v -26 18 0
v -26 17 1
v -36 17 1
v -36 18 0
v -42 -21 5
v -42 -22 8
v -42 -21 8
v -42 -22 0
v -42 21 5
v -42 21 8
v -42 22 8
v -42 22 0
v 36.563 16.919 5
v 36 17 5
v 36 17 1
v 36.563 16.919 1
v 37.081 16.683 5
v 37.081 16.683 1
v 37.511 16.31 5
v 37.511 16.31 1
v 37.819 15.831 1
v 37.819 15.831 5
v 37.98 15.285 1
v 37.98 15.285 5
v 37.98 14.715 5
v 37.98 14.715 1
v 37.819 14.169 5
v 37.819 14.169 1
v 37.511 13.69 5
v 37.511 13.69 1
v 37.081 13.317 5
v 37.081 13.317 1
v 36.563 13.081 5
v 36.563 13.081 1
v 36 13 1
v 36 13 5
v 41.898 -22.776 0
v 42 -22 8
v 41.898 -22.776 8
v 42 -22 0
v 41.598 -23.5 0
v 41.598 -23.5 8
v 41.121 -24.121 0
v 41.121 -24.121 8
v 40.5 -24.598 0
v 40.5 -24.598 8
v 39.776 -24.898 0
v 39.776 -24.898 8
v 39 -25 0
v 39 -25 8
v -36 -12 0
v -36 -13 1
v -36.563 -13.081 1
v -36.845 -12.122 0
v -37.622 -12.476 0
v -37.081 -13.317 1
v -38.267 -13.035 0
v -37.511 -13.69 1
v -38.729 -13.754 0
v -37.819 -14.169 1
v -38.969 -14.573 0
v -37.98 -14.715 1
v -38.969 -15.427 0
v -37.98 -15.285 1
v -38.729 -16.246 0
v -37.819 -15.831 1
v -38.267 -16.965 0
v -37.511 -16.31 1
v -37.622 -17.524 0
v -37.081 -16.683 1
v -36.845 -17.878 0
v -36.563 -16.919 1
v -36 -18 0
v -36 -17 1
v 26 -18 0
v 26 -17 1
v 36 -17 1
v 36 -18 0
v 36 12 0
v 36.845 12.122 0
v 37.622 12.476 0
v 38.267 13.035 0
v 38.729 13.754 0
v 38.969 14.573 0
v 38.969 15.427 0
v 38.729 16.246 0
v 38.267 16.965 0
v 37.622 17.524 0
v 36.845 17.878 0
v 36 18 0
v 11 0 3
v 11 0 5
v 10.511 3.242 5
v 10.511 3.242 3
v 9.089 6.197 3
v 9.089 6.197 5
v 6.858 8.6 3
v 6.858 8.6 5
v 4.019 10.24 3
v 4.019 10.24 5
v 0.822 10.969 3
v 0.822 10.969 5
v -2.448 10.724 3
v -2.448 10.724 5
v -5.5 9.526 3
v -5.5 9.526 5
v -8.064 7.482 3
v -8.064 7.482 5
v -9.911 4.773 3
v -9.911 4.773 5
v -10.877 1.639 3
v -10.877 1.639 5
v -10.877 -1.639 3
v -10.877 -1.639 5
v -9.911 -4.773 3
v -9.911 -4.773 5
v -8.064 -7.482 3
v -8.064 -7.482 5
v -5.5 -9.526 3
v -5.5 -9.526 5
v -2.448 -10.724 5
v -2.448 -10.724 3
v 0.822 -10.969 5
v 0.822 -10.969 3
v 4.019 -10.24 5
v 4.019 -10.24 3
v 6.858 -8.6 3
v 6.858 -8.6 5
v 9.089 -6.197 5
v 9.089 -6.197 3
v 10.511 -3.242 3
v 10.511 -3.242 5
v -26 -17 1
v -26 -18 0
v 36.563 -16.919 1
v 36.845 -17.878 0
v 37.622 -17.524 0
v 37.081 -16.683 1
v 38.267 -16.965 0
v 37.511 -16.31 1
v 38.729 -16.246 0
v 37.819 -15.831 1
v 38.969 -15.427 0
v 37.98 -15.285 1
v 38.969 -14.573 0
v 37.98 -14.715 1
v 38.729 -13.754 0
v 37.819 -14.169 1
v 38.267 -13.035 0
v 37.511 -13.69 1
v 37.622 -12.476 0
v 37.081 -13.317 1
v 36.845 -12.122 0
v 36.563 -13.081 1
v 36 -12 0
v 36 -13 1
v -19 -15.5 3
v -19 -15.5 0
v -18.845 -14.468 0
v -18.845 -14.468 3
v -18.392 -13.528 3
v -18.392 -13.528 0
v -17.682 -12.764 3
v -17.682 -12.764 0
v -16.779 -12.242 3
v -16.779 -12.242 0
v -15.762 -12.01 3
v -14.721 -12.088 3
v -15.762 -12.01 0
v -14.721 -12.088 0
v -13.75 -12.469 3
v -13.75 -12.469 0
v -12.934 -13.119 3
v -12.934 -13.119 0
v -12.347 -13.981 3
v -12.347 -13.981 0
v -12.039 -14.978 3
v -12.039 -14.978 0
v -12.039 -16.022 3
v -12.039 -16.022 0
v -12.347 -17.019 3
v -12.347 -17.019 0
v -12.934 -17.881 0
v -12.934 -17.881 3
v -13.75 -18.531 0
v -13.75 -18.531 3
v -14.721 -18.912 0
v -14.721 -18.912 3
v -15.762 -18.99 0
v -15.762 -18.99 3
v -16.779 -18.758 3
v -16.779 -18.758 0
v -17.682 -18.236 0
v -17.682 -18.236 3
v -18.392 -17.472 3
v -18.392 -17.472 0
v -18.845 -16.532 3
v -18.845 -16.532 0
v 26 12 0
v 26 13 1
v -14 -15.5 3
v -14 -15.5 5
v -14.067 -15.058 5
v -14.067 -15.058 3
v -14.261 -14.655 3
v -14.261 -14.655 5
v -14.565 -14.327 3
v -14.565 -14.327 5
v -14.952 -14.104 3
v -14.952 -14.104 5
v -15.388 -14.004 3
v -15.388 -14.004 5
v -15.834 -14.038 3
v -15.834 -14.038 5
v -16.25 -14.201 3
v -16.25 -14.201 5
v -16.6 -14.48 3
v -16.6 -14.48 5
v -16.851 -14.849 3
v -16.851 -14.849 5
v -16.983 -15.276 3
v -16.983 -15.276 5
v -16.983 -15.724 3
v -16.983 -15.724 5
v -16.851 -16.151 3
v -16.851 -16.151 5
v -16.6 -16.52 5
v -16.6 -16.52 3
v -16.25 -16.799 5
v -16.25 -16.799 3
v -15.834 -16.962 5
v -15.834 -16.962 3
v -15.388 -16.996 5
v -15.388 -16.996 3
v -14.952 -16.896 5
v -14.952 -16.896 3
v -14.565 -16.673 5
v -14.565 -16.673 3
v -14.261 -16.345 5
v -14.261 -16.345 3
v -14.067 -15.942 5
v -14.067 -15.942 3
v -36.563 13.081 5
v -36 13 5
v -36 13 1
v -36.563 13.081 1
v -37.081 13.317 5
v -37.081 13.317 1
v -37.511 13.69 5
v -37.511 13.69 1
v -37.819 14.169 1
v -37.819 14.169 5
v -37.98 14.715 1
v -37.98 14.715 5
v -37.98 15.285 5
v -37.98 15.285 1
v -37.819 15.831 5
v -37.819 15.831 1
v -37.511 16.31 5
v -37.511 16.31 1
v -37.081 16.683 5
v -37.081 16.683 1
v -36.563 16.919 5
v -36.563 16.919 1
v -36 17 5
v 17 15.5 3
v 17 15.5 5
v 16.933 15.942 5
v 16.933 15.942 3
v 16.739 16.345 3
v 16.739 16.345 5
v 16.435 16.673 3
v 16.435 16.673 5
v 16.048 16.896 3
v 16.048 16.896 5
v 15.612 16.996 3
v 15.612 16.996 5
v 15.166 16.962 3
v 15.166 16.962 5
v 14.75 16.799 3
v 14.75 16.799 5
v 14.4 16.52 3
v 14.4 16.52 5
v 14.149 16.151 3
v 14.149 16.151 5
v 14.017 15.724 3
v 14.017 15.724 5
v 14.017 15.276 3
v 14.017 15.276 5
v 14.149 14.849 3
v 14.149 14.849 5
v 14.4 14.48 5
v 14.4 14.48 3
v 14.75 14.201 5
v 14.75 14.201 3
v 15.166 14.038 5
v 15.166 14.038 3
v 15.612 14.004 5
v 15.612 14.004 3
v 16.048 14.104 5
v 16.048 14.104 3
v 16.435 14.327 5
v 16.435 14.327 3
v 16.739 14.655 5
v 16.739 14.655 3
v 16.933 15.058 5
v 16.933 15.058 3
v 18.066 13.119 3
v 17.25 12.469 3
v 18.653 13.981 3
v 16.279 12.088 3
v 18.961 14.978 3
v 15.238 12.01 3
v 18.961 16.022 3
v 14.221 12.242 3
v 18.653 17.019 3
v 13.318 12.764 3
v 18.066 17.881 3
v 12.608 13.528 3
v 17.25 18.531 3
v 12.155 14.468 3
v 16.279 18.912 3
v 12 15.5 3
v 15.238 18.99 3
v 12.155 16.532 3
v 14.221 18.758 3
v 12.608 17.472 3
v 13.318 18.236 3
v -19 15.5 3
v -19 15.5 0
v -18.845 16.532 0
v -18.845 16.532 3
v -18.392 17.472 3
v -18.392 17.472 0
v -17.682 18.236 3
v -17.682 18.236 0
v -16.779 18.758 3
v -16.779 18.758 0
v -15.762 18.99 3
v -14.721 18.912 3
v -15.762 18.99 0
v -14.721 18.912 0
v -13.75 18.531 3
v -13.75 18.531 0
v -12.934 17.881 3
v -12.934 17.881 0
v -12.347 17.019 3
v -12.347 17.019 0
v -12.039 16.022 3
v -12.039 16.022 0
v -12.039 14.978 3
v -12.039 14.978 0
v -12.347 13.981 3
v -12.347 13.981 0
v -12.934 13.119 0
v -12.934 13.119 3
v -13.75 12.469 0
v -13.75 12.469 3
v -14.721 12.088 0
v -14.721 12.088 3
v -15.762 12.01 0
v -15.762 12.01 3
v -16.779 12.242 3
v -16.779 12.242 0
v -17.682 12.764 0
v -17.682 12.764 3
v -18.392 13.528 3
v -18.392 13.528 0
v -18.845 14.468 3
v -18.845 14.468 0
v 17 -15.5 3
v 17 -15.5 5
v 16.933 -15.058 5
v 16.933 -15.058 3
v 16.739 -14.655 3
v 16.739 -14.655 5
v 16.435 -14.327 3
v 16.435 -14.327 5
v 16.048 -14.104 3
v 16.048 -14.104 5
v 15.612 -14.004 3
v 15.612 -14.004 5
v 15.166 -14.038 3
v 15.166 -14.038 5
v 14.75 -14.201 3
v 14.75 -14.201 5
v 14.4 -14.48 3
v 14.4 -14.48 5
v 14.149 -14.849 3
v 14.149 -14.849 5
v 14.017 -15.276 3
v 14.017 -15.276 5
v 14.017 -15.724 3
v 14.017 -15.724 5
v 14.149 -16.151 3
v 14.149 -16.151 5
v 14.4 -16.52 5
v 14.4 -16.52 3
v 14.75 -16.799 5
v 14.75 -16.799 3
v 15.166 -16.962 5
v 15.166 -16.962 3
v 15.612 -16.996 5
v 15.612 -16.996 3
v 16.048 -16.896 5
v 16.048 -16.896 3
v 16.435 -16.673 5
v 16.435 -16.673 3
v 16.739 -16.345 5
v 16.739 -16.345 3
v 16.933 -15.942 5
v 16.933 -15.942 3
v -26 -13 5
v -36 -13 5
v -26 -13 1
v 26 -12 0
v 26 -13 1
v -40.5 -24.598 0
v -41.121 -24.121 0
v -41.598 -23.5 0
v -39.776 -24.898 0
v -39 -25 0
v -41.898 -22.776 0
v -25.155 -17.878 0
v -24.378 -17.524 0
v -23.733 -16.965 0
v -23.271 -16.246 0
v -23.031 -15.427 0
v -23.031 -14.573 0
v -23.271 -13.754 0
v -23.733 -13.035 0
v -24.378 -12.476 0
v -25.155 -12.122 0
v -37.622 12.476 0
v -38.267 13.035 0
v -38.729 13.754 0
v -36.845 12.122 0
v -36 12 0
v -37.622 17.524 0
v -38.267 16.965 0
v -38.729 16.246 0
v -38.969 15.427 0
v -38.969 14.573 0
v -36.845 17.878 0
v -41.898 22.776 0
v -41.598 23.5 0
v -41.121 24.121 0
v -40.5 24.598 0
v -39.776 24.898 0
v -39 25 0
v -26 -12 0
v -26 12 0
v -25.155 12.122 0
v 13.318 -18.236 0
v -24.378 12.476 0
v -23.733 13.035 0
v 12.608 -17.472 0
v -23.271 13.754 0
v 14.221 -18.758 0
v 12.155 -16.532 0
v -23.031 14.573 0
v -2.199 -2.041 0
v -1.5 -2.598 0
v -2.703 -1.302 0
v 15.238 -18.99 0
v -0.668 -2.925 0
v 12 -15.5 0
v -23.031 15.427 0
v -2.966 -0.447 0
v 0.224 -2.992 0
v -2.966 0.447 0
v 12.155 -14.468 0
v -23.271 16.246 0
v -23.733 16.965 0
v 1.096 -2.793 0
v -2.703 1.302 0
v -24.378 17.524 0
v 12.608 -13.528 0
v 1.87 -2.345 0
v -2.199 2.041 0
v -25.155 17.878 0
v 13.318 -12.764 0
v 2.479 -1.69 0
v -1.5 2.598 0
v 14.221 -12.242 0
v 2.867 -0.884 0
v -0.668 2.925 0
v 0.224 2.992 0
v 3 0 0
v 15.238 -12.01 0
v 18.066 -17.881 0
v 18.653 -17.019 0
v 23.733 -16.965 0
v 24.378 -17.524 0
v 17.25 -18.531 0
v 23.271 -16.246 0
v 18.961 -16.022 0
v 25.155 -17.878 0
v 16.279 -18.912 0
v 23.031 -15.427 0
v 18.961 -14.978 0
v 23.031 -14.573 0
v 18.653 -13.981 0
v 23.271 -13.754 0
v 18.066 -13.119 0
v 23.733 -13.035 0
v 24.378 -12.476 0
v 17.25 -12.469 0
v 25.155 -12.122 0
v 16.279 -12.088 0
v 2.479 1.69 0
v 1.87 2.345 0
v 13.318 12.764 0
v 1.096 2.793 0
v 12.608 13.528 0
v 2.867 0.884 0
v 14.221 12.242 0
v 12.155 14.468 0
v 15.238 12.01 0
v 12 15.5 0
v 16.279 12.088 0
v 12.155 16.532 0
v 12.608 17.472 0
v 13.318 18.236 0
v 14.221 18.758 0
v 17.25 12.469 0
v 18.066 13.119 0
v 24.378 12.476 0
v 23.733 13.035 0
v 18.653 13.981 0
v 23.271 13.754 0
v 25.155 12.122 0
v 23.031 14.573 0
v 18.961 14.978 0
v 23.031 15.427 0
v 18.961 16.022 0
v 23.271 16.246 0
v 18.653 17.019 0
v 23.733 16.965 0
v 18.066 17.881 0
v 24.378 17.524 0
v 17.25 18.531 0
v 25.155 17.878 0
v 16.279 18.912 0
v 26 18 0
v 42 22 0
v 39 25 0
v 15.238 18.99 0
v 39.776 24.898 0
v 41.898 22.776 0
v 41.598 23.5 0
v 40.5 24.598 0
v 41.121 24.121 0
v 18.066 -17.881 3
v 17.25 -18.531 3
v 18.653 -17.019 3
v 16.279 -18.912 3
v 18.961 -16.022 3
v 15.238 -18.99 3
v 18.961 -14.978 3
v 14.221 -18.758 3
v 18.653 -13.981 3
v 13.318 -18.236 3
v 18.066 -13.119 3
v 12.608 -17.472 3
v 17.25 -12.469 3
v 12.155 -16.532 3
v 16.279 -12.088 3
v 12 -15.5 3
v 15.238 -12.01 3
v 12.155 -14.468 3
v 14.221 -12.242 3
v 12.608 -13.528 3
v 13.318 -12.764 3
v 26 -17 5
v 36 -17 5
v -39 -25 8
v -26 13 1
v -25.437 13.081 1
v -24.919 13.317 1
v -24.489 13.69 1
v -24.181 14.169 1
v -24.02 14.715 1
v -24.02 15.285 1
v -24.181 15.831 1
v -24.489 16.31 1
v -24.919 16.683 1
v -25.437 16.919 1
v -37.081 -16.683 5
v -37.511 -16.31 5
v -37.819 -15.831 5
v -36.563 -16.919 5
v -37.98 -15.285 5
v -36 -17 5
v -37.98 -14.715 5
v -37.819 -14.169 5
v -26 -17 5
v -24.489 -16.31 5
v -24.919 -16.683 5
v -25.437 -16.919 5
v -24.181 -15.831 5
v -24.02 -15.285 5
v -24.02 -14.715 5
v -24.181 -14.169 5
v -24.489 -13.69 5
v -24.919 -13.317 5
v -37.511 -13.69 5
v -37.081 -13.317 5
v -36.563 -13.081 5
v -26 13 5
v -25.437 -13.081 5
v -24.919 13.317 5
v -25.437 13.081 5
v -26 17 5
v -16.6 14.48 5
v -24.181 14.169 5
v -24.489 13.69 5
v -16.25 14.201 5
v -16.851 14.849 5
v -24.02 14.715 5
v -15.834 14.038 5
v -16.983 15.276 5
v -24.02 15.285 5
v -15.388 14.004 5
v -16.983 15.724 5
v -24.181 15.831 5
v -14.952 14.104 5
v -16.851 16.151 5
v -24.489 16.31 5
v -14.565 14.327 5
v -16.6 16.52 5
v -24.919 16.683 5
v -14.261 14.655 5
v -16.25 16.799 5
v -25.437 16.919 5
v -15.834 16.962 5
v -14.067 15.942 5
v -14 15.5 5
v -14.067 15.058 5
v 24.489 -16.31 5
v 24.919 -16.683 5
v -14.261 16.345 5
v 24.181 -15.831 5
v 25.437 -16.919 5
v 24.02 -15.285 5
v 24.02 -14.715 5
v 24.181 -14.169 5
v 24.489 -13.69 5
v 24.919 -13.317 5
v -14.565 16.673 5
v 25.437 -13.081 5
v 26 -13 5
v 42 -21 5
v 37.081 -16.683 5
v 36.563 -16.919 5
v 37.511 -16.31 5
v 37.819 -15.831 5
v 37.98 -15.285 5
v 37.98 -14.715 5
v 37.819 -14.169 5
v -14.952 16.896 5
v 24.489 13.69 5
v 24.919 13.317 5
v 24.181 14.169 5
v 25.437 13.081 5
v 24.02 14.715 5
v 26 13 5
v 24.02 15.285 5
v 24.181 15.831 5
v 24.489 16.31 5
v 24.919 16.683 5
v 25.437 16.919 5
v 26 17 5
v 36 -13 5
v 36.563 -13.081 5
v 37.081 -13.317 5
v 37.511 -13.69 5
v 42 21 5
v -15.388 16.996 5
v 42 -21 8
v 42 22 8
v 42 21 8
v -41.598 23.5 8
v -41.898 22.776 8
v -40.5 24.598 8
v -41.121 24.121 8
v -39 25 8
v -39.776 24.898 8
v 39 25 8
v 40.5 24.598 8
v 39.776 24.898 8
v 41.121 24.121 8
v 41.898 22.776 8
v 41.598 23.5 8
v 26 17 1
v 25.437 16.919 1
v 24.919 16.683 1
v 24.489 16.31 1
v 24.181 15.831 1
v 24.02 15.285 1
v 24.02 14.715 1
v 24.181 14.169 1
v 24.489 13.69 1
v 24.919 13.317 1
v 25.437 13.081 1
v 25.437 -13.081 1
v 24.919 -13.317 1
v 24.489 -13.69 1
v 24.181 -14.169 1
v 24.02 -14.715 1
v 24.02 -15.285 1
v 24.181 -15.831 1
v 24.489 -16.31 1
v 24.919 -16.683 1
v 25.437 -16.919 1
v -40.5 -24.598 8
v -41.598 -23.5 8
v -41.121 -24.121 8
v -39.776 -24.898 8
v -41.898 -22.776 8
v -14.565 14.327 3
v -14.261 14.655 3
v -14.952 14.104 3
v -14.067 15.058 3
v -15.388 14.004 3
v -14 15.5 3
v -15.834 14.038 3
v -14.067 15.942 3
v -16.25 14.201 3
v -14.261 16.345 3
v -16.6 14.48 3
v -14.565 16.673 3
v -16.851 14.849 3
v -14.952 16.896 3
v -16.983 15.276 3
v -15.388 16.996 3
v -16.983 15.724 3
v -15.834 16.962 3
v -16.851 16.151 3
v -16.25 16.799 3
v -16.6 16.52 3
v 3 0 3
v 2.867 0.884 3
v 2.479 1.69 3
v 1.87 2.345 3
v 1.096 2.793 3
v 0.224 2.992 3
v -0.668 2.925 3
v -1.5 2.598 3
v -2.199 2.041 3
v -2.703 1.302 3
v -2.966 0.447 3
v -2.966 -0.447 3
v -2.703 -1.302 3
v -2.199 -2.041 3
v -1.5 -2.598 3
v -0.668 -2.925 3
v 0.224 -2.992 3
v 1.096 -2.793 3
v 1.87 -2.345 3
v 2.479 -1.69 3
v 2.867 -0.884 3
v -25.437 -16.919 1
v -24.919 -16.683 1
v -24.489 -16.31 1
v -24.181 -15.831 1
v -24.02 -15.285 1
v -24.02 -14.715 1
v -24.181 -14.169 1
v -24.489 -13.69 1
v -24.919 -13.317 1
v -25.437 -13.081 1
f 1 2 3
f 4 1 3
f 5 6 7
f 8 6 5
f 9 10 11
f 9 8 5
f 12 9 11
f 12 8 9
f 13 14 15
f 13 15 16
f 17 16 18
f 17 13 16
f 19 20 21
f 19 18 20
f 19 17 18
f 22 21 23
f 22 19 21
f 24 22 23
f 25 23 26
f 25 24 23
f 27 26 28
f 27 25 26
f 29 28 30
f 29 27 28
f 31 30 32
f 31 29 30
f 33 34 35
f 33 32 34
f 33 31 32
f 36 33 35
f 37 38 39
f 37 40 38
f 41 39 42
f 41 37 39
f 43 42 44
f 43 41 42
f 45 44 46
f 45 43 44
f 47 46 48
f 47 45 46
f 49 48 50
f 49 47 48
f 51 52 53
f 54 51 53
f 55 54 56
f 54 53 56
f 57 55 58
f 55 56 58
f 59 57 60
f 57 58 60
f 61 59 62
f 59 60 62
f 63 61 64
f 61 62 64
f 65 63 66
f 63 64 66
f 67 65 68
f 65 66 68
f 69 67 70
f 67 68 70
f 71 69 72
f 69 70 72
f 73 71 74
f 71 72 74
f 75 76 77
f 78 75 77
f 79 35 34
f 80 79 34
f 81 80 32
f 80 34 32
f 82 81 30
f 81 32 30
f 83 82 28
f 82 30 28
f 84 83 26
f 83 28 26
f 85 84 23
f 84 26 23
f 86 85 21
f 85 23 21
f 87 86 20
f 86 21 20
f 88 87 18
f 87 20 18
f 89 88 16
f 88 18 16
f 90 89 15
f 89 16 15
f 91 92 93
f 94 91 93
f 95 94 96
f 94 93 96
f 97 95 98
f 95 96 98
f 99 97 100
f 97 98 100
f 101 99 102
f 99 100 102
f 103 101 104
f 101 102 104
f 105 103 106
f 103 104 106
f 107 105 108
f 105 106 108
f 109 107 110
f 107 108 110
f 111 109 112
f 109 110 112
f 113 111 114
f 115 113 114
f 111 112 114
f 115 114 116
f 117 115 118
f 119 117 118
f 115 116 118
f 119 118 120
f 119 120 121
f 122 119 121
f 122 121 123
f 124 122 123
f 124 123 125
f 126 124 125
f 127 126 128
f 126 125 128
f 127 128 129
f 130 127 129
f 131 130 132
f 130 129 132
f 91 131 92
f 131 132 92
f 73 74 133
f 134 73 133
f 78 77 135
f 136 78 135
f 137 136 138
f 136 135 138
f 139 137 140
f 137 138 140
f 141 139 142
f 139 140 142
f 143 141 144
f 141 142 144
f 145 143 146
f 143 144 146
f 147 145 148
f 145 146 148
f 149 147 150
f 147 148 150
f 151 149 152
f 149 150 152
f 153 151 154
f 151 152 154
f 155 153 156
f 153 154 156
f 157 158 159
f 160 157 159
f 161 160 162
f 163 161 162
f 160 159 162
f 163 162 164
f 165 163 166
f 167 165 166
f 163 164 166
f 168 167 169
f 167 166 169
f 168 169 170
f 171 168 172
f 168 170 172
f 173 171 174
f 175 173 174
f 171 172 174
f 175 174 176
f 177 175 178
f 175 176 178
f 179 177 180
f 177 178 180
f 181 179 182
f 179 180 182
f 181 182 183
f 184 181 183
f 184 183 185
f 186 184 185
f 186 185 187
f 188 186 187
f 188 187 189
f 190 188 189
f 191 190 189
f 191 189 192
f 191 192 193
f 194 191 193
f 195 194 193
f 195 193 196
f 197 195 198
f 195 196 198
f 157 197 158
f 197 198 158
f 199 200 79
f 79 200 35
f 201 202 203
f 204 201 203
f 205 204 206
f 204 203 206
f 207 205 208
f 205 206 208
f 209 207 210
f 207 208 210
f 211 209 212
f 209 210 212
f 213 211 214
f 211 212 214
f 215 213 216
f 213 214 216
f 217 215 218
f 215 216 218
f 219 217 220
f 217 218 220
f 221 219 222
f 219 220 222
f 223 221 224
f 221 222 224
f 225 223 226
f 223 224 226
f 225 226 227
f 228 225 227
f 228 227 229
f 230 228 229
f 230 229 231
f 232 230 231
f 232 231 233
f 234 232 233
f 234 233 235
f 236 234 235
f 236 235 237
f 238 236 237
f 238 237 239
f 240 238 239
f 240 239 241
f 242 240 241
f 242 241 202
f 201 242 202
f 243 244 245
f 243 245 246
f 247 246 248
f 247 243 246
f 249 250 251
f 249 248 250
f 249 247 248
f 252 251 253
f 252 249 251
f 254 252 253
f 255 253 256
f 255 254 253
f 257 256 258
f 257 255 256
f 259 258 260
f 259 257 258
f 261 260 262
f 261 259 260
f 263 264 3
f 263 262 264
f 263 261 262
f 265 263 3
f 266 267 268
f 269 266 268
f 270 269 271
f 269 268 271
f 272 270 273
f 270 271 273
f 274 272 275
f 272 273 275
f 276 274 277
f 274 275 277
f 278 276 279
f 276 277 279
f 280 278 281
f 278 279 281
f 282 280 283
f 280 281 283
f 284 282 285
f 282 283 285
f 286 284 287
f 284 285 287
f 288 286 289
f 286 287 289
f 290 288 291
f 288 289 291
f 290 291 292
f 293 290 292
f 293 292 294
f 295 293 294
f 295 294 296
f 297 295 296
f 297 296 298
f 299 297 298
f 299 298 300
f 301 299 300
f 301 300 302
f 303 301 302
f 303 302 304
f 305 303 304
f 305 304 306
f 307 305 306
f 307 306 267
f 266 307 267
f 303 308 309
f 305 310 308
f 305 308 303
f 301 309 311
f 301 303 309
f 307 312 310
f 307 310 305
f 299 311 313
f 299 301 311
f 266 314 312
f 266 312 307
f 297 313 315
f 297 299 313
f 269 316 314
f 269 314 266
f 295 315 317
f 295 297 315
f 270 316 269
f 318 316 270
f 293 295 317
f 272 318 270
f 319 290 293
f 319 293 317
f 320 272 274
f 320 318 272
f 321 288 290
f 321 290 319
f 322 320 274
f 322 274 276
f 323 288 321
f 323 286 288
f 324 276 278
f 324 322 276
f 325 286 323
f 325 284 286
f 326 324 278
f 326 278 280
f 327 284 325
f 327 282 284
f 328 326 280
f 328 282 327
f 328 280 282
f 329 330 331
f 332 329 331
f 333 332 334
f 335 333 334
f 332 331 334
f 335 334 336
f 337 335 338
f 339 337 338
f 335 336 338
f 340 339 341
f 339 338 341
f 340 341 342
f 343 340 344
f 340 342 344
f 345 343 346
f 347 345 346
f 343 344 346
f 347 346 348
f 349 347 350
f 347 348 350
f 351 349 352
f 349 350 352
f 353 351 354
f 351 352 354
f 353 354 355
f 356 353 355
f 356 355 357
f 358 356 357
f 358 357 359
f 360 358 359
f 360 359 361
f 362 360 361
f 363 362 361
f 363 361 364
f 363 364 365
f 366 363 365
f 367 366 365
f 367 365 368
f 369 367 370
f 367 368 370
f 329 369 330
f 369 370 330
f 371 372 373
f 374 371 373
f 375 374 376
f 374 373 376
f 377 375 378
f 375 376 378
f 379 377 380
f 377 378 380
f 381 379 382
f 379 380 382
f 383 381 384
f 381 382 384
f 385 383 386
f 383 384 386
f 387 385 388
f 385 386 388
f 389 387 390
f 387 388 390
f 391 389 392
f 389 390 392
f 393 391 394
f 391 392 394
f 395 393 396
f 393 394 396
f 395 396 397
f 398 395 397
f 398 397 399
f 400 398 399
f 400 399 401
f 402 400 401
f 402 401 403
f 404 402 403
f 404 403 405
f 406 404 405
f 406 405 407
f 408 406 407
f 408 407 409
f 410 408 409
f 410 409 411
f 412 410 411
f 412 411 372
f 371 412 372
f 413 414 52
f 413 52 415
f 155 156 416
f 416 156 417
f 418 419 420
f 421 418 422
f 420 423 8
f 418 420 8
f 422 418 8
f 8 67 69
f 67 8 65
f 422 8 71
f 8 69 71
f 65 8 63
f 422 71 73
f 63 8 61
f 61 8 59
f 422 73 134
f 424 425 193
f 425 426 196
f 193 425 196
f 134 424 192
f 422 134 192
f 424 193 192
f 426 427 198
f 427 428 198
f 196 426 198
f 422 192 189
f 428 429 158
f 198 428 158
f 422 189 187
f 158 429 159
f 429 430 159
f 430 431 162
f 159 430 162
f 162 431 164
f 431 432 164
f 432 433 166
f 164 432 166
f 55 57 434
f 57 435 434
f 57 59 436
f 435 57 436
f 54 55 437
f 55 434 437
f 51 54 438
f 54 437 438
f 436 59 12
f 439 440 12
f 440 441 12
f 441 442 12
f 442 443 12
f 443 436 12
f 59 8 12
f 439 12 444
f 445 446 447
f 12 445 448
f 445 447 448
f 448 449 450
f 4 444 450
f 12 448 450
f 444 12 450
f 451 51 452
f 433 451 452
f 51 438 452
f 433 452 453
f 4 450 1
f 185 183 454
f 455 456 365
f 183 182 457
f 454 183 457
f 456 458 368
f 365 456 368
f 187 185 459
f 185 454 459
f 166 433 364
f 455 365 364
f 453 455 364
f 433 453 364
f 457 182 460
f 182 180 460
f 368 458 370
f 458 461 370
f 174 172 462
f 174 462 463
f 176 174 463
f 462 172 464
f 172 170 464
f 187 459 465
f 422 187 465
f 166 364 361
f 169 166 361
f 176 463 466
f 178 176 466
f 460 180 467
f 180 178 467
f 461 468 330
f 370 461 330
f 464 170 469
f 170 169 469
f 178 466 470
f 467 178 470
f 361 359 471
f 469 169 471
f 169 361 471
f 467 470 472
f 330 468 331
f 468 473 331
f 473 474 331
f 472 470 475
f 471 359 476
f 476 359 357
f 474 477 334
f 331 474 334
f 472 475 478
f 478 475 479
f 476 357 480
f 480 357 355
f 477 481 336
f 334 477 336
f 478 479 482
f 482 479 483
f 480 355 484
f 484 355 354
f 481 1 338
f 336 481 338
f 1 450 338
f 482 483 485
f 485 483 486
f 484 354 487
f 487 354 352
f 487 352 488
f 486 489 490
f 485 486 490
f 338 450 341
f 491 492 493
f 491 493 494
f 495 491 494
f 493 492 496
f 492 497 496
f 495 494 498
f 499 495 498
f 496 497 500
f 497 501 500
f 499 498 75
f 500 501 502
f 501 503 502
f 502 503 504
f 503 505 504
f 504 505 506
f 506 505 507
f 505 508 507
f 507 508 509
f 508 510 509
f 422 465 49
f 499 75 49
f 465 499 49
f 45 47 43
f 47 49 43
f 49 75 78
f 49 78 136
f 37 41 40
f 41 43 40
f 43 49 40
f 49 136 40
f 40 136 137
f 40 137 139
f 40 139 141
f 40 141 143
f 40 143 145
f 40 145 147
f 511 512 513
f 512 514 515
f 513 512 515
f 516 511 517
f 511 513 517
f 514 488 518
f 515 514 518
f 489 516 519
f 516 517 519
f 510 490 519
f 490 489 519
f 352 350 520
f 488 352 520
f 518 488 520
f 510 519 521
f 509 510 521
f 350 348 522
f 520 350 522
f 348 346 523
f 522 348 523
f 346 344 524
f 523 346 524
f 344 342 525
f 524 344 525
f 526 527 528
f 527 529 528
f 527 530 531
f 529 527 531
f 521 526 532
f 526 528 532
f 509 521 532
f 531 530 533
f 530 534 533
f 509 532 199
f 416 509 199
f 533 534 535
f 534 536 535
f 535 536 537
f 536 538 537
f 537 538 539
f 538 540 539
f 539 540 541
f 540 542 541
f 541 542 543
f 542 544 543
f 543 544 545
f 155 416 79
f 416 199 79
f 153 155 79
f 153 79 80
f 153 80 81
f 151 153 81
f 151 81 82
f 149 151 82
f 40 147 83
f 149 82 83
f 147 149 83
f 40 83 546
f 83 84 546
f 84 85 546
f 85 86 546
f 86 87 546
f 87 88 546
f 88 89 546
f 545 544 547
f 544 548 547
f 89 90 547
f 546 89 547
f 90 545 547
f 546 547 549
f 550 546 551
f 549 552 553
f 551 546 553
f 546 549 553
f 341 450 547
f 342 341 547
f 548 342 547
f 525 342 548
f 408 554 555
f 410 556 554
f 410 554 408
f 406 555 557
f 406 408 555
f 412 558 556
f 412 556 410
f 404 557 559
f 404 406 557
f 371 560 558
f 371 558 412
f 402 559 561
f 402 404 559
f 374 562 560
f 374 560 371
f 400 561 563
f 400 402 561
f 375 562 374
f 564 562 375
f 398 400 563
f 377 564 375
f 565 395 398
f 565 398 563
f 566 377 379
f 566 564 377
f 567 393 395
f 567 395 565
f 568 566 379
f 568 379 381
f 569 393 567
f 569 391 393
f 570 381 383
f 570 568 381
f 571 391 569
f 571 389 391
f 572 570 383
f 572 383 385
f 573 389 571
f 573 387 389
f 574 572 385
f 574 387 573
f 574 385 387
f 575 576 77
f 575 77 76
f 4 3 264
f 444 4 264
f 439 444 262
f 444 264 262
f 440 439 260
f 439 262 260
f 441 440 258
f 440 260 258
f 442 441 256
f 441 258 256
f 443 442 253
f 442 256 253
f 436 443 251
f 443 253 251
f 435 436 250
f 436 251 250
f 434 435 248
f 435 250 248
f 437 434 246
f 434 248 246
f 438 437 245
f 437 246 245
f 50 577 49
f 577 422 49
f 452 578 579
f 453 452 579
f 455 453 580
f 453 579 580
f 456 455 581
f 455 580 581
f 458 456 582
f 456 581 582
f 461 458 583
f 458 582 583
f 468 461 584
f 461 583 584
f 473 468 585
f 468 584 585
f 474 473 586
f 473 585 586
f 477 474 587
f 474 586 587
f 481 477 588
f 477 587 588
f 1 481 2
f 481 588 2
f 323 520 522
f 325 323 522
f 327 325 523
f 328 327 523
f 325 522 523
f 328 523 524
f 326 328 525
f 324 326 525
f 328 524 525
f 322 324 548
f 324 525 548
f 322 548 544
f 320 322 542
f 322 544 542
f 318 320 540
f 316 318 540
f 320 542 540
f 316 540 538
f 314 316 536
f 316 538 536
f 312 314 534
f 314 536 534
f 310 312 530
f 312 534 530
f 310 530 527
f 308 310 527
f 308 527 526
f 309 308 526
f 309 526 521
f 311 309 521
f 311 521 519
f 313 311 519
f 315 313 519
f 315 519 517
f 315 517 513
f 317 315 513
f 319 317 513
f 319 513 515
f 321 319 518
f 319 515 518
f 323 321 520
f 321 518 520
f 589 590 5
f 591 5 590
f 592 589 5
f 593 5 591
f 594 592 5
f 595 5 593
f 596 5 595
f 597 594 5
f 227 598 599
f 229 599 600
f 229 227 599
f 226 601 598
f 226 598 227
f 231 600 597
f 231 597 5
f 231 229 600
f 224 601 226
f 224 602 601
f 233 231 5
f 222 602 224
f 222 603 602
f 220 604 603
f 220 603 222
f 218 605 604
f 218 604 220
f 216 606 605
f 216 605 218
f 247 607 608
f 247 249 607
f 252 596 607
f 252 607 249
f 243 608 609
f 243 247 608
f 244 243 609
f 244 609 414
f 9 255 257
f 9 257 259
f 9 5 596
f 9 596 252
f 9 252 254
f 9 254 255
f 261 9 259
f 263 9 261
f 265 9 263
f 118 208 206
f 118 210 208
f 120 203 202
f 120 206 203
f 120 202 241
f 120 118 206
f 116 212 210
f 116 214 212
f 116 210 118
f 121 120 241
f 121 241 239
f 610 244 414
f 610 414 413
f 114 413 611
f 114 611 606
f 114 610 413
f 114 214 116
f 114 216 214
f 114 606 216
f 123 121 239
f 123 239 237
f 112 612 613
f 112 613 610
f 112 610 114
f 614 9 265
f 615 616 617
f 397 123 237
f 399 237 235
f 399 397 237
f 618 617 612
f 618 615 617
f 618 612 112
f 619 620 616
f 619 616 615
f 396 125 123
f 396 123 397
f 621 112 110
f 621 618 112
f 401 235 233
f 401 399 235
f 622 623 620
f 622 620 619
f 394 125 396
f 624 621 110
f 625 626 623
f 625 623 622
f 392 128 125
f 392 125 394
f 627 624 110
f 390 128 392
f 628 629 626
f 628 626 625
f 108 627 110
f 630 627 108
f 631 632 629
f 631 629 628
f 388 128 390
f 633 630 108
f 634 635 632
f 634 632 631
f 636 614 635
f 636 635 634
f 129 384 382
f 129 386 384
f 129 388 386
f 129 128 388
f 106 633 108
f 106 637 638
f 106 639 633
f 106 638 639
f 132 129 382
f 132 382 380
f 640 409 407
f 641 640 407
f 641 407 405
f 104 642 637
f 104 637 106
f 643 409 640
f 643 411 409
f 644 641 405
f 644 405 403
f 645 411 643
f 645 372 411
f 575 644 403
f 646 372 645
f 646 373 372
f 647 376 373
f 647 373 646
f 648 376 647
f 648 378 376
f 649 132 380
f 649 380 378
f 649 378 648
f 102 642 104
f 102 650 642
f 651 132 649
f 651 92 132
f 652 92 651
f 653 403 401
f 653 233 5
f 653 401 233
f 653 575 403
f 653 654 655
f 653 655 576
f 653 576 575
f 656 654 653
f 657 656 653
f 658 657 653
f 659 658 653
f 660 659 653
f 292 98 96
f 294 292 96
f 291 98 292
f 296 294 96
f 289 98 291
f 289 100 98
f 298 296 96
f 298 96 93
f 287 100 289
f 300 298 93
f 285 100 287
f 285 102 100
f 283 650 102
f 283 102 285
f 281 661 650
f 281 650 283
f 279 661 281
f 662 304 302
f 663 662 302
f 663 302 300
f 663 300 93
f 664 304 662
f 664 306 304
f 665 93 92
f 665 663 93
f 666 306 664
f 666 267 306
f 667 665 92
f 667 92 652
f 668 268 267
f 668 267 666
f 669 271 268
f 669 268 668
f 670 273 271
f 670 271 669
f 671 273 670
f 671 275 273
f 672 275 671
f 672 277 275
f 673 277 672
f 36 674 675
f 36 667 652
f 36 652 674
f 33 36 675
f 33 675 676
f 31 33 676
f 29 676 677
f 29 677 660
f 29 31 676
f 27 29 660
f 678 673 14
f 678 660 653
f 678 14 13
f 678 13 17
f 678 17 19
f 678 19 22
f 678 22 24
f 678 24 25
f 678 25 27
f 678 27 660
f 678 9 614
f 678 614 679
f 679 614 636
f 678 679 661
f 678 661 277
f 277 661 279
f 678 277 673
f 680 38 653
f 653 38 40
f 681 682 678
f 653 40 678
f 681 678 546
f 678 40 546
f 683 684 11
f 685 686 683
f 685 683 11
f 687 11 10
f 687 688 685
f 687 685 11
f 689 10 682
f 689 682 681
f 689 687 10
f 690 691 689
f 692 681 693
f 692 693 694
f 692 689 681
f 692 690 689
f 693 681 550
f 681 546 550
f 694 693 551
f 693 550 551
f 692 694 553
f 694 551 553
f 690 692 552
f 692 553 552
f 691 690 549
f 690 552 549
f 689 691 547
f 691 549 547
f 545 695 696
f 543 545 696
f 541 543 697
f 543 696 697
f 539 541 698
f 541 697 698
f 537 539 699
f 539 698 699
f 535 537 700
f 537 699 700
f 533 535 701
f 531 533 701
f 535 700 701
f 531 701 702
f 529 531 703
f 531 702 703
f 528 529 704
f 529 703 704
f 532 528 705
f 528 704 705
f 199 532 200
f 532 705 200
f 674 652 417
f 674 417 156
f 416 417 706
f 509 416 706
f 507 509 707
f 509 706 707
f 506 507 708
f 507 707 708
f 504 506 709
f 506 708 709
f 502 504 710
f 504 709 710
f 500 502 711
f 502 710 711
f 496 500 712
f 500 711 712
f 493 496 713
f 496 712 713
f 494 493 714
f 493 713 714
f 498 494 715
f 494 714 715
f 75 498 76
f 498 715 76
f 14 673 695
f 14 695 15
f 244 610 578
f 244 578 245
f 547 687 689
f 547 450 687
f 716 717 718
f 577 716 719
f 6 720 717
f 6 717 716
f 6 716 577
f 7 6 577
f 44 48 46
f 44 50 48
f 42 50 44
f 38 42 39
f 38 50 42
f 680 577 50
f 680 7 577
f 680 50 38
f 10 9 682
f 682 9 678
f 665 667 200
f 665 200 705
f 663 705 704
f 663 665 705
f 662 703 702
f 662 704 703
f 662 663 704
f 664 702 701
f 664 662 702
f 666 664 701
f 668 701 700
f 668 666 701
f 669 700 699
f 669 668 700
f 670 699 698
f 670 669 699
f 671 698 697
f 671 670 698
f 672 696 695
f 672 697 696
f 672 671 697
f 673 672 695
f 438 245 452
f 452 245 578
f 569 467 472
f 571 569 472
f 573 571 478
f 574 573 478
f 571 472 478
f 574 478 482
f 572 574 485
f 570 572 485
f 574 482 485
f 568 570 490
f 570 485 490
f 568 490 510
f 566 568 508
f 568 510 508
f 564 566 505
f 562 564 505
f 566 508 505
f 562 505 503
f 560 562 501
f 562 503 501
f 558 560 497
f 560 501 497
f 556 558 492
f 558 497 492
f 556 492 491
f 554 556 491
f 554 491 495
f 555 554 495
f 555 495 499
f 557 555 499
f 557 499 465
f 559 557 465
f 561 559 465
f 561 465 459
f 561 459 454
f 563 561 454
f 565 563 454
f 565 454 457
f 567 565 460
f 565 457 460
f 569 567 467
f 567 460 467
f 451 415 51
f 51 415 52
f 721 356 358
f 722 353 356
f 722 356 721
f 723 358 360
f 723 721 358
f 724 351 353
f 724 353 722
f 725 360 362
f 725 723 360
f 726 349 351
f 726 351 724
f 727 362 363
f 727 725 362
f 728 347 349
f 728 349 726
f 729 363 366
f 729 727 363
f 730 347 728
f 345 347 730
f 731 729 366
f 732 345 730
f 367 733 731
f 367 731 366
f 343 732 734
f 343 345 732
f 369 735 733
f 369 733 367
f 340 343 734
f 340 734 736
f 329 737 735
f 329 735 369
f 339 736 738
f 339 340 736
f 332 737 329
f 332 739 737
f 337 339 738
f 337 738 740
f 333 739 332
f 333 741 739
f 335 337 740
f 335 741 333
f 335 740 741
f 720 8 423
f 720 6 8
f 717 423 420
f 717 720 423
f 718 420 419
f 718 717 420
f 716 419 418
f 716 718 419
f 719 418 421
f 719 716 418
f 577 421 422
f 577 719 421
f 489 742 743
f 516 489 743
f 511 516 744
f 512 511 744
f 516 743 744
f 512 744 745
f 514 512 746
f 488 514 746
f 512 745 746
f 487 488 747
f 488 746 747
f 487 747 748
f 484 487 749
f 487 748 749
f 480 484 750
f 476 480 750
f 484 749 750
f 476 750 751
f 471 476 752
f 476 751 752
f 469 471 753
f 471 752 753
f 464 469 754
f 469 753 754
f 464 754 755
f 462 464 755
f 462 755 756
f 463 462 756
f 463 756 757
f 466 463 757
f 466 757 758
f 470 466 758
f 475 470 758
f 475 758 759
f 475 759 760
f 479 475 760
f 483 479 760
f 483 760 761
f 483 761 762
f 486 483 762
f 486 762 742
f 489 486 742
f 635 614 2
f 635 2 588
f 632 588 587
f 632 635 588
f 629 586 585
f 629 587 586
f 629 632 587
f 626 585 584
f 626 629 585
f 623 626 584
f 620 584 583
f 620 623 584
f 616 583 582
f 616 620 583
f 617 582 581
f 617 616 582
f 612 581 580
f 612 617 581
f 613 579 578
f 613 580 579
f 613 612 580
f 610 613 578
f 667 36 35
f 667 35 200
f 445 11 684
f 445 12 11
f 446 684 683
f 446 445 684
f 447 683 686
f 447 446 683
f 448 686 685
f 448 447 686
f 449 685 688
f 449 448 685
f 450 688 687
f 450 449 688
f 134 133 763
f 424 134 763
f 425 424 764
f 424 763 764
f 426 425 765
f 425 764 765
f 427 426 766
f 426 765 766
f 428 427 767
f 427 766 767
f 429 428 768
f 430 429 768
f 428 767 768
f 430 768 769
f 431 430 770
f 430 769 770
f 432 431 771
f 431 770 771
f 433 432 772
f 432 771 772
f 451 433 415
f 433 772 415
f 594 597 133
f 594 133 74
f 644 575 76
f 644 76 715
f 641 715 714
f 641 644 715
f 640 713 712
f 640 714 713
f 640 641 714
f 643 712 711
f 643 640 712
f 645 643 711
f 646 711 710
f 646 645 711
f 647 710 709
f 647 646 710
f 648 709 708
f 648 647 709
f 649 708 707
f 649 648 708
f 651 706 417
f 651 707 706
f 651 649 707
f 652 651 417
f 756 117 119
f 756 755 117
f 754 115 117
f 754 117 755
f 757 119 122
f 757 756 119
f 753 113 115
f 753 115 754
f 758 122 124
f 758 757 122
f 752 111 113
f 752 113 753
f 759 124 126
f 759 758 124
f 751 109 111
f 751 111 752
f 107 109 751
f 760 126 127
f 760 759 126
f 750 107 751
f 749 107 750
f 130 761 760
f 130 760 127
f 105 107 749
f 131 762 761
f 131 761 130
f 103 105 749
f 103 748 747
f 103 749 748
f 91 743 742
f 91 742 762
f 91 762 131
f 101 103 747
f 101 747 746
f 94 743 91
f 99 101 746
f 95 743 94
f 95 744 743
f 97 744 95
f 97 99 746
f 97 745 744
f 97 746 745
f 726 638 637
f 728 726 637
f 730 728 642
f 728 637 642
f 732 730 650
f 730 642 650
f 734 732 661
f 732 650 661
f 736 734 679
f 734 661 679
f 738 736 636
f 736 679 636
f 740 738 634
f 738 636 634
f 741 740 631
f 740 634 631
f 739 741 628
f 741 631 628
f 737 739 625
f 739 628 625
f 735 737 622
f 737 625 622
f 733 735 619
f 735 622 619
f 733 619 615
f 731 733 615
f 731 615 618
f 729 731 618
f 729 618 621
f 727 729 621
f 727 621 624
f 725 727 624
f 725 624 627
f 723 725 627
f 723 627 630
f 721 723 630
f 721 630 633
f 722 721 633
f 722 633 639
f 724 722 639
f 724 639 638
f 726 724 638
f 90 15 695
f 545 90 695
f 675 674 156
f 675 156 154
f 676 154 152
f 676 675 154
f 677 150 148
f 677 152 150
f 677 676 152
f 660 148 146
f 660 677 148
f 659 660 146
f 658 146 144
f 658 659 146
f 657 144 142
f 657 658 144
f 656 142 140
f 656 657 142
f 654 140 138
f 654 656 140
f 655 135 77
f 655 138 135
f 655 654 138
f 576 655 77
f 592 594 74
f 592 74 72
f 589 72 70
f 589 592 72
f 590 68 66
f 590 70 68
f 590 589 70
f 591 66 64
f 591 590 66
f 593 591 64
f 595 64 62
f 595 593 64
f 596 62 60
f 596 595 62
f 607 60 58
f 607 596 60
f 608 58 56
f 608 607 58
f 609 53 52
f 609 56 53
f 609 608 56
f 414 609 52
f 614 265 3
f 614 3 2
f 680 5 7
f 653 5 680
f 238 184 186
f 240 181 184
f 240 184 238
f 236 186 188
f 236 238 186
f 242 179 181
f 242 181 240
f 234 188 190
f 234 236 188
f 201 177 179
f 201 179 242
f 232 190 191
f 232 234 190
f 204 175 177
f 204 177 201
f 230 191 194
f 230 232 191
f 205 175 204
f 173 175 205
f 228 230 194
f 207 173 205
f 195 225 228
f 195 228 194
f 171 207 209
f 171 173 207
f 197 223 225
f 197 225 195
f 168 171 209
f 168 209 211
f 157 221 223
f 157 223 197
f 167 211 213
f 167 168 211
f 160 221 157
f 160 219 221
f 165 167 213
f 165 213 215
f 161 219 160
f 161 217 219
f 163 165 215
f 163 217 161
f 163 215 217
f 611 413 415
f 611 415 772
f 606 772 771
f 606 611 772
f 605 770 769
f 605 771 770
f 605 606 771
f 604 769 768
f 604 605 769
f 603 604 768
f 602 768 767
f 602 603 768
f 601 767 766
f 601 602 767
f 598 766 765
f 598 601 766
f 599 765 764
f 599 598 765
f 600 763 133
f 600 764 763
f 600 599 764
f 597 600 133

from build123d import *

# Parameters (mm, degrees)
CROQUIS1_W              = 84
CROQUIS1_H              = 50
SALIENTE_EXTRUIR1_DEPTH = 5
CORTAR_EXTRUIR5_DEPTH   = 50.132473986
CROQUIS2_R              = 3
CORTAR_EXTRUIR1_DEPTH   = 50.132473986
CROQUIS3_R              = 11
CORTAR_EXTRUIR2_DEPTH   = 2
CROQUIS4_R              = 1.5
CORTAR_EXTRUIR3_DEPTH   = 50.132473986
CROQUIS5_R              = 3.5
CORTAR_EXTRUIR4_DEPTH   = 3
CROQUIS7_W              = 84
CROQUIS7_H              = 4
SALIENTE_EXTRUIR2_DEPTH = 3
REDONDEO1_R             = 3
CHAFL_N1_SIZE           = 1


with BuildPart() as part:
    # Croquis1 → Saliente-Extruir1 (new body)
    with BuildSketch(Plane.XY):
        Rectangle(CROQUIS1_W, CROQUIS1_H)
    extrude(amount=SALIENTE_EXTRUIR1_DEPTH)

    # Croquis6 → Cortar-Extruir5 (cut, through all)
    with BuildSketch(Plane.XY.offset(5)):
        with BuildLine():
            Line((-36, 17), (-26, 17))
            ThreePointArc((-26, 17), (-24, 15), (-26, 13))
            Line((-26, 13), (-36, 13))
            ThreePointArc((-36, 13), (-38, 15), (-36, 17))
        make_face()
        with BuildLine():
            Line((36, 13), (26, 13))
            ThreePointArc((26, 13), (24, 15), (26, 17))
            Line((26, 17), (36, 17))
            ThreePointArc((36, 17), (38, 15), (36, 13))
        make_face()
        with BuildLine():
            Line((36, -17), (26, -17))
            ThreePointArc((26, -17), (24, -15), (26, -13))
            Line((26, -13), (36, -13))
            ThreePointArc((36, -13), (38, -15), (36, -17))
        make_face()
        with BuildLine():
            Line((-36, -13), (-26, -13))
            ThreePointArc((-26, -13), (-24, -15), (-26, -17))
            Line((-26, -17), (-36, -17))
            ThreePointArc((-36, -17), (-38, -15), (-36, -13))
        make_face()
    extrude(amount=-CORTAR_EXTRUIR5_DEPTH, mode=Mode.SUBTRACT)

    # Croquis2 → Cortar-Extruir1 (cut, through all)
    with BuildSketch(Plane.XY.offset(5)):
        Circle(CROQUIS2_R)
    extrude(amount=-CORTAR_EXTRUIR1_DEPTH, mode=Mode.SUBTRACT)

    # Croquis3 → Cortar-Extruir2 (cut)
    with BuildSketch(Plane.XY.offset(5)):
        Circle(CROQUIS3_R)
    extrude(amount=-CORTAR_EXTRUIR2_DEPTH, mode=Mode.SUBTRACT)

    # Croquis4 → Cortar-Extruir3 (cut, through all)
    with BuildSketch(Plane.XY.offset(5)):
        with Locations((15.5, 15.5)):
            Circle(CROQUIS4_R)
        with Locations((-15.5, 15.5)):
            Circle(CROQUIS4_R)
        with Locations((-15.5, -15.5)):
            Circle(CROQUIS4_R)
        with Locations((15.5, -15.5)):
            Circle(CROQUIS4_R)
    extrude(amount=-CORTAR_EXTRUIR3_DEPTH, mode=Mode.SUBTRACT)

    # Croquis5 → Cortar-Extruir4 (cut)
    with BuildSketch(Plane(origin=(0, 0, 0), x_dir=(-1, 0, 0), z_dir=(0, 0, -1))):
        with Locations((-15.5, 15.5)):
            Circle(CROQUIS5_R)
        with Locations((15.5, 15.5)):
            Circle(CROQUIS5_R)
        with Locations((15.5, -15.5)):
            Circle(CROQUIS5_R)
        with Locations((-15.5, -15.5)):
            Circle(CROQUIS5_R)
    extrude(amount=-CORTAR_EXTRUIR4_DEPTH, mode=Mode.SUBTRACT)

    # Croquis7 → Saliente-Extruir2 (add)
    with BuildSketch(Plane.XY.offset(5)):
        with Locations((0, 23)):
            Rectangle(CROQUIS7_W, CROQUIS7_H)
        with Locations((0, -23)):
            Rectangle(CROQUIS7_W, CROQUIS7_H)
    extrude(amount=SALIENTE_EXTRUIR2_DEPTH)

    # Redondeo1
    redondeo1_edges = [part.edges().sort_by_distance(p)[0] for p in [
        (42, -25, 4),
        (-42, -25, 4),
        (-42, 25, 4),
        (42, 25, 4),
    ]]
    fillet(redondeo1_edges, radius=REDONDEO1_R)

    # Chaflán1
    chafl_n1_edges = [part.edges().sort_by_distance(p)[0] for p in [
        (-38, 15, 0),
        (-31, 17, 0),
        (-24, 15, 0),
        (-31, 13, 0),
        (38, 15, 0),
        (31, 13, 0),
        (24, 15, 0),
        (31, 17, 0),
        (38, -15, 0),
        (31, -17, 0),
        (24, -15, 0),
        (31, -13, 0),
        (-38, -15, 0),
        (-31, -13, 0),
        (-24, -15, 0),
        (-31, -17, 0),
    ]]
    chamfer(chafl_n1_edges, length=CHAFL_N1_SIZE)


solid = part.part
